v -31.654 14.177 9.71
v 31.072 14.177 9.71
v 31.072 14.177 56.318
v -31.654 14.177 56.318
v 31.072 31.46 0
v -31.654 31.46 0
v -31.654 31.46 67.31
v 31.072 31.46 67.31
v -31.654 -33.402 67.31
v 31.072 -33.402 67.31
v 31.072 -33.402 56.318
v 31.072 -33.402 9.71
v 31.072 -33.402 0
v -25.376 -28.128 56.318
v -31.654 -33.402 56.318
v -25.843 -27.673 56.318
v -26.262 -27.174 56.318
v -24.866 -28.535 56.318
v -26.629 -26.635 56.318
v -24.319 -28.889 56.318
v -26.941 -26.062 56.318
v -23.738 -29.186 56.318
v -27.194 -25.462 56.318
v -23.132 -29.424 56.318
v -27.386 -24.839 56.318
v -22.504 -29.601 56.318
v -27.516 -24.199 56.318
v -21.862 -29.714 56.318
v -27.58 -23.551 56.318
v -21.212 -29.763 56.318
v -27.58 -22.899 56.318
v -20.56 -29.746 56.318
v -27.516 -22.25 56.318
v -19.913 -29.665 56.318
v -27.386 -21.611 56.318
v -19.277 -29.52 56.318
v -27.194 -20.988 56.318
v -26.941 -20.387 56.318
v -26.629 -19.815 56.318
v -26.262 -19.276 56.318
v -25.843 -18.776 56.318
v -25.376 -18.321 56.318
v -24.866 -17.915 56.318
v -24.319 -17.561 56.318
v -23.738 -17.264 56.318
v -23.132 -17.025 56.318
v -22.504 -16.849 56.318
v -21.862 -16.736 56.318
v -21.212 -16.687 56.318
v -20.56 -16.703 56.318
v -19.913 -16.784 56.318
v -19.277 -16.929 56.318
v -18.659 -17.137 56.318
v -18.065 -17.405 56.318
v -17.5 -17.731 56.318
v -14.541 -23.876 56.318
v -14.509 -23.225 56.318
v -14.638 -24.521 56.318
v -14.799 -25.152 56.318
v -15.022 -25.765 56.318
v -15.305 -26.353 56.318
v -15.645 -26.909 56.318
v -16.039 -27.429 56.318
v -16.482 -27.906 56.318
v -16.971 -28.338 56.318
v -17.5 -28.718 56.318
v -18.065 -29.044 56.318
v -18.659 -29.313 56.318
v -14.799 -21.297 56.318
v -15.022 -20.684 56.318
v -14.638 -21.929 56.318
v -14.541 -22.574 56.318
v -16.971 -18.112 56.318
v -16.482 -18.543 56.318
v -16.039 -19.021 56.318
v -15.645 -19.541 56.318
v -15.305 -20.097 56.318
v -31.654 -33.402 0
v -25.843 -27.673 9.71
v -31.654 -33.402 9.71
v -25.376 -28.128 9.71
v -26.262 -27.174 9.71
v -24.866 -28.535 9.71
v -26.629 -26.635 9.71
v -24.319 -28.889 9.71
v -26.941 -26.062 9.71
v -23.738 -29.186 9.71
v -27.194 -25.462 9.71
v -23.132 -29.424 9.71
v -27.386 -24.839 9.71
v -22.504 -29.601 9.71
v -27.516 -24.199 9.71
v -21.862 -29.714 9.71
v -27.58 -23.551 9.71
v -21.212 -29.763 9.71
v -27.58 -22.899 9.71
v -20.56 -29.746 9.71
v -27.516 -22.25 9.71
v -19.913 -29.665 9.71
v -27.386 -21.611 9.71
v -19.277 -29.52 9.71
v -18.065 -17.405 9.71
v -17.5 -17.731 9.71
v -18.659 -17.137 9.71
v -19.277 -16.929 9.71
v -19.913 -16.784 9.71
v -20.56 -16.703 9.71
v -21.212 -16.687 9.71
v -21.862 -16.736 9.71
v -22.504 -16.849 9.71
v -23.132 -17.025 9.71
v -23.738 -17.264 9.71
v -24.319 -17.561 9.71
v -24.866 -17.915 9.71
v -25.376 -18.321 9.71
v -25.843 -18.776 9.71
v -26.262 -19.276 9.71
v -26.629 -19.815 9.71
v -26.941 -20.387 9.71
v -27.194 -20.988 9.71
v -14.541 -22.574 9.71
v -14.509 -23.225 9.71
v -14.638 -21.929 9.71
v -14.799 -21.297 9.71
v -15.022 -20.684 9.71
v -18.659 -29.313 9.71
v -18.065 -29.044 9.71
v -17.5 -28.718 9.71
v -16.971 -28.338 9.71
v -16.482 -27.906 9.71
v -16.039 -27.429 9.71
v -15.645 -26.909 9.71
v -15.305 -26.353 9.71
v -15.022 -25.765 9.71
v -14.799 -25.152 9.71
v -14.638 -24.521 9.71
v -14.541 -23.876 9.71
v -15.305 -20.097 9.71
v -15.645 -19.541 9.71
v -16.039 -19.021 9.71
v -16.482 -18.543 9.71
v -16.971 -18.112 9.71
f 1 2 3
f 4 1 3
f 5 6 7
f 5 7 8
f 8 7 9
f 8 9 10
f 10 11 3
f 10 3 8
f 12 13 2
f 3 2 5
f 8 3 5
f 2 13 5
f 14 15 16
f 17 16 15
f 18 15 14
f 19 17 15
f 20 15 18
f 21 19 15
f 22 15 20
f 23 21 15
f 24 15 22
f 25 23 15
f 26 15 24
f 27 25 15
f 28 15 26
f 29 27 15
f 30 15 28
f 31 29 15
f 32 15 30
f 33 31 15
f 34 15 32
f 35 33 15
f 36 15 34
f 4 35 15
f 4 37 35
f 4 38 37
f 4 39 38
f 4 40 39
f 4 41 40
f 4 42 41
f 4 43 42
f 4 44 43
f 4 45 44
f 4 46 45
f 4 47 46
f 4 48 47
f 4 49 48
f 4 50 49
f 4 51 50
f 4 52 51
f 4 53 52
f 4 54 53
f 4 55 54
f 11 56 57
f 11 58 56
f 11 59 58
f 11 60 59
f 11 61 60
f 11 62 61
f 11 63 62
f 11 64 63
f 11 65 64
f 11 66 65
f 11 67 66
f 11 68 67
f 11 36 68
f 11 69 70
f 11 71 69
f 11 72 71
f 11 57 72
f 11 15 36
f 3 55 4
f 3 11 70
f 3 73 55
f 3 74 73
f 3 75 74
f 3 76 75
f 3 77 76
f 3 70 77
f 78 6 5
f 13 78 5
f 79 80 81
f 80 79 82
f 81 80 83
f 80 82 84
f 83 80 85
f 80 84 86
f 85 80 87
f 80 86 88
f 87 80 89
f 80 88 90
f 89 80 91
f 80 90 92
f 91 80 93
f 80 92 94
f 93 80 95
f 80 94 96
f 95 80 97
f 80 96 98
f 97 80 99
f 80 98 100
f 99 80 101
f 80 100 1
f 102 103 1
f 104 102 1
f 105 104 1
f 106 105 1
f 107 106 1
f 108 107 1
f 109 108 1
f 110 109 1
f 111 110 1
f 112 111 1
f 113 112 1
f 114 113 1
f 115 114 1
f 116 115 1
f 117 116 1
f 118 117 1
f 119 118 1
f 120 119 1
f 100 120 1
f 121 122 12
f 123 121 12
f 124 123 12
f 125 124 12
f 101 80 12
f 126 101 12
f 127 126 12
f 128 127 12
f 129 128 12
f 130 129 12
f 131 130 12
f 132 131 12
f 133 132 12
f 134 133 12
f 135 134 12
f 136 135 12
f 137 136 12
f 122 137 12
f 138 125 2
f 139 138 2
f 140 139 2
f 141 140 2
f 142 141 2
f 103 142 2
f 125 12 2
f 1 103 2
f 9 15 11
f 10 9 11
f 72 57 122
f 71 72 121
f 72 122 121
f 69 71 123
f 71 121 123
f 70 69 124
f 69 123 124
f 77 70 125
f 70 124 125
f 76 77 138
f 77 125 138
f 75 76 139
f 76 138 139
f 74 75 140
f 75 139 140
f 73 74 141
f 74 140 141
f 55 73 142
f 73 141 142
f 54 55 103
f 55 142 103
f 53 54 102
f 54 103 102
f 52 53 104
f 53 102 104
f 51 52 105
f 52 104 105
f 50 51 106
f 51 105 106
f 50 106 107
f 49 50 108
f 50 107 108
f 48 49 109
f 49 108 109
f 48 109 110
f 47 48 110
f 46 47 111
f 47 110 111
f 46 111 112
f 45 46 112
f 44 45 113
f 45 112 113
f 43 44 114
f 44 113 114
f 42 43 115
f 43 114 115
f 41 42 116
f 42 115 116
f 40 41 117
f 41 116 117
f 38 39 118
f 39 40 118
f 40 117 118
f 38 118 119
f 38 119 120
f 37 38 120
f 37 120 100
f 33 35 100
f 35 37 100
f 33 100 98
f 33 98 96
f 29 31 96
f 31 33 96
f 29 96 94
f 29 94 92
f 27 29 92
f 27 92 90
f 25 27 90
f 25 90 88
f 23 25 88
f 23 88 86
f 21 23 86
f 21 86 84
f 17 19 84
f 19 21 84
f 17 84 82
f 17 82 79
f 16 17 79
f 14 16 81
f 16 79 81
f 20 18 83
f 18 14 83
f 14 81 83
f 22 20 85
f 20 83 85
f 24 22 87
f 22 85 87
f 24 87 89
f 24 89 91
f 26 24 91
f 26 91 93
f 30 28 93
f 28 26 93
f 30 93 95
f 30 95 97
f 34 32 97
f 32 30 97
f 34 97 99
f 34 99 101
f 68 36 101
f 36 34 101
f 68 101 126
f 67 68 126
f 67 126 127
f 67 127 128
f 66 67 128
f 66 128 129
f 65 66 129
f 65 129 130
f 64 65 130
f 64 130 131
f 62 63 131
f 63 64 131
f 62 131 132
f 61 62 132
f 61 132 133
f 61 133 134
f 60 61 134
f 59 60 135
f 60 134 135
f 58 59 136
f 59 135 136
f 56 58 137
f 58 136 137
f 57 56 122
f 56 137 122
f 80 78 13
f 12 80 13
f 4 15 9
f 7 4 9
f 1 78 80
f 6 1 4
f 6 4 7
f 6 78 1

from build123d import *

# Parameters (mm, degrees)
F0_W     = 62.7262871712
F0_H     = 64.8624785244
F1_DEPTH = 67.31
F2_W     = 47.5787650794
F2_H     = 46.6077653691
F3_DEPTH = 72.644
F4_R     = 6.5399432167
F5_DEPTH = 52.07


with BuildPart() as f1:
    # F0 (on Top) → F1 (new body)
    with BuildSketch(Plane.XY):
        with Locations((-0.2912962809, -0.9709950536)):
            Rectangle(F0_W, F0_H)
    extrude(amount=F1_DEPTH)

    # F2 (on face) → F3 (cut)
    with BuildSketch(Plane.YZ.offset(31.0718473047)):
        with Locations((-9.6128517762, 33.0138341524)):
            Rectangle(F2_W, F2_H)
    extrude(amount=-F3_DEPTH, mode=Mode.SUBTRACT)

    # F4 (on face) → F5 (join)
    with BuildSketch(Plane.XY.offset(9.7099514678)):
        with Locations((-21.0486296564, -23.2247561216)):
            Circle(F4_R)
    extrude(amount=F5_DEPTH)


solid = f1.part
